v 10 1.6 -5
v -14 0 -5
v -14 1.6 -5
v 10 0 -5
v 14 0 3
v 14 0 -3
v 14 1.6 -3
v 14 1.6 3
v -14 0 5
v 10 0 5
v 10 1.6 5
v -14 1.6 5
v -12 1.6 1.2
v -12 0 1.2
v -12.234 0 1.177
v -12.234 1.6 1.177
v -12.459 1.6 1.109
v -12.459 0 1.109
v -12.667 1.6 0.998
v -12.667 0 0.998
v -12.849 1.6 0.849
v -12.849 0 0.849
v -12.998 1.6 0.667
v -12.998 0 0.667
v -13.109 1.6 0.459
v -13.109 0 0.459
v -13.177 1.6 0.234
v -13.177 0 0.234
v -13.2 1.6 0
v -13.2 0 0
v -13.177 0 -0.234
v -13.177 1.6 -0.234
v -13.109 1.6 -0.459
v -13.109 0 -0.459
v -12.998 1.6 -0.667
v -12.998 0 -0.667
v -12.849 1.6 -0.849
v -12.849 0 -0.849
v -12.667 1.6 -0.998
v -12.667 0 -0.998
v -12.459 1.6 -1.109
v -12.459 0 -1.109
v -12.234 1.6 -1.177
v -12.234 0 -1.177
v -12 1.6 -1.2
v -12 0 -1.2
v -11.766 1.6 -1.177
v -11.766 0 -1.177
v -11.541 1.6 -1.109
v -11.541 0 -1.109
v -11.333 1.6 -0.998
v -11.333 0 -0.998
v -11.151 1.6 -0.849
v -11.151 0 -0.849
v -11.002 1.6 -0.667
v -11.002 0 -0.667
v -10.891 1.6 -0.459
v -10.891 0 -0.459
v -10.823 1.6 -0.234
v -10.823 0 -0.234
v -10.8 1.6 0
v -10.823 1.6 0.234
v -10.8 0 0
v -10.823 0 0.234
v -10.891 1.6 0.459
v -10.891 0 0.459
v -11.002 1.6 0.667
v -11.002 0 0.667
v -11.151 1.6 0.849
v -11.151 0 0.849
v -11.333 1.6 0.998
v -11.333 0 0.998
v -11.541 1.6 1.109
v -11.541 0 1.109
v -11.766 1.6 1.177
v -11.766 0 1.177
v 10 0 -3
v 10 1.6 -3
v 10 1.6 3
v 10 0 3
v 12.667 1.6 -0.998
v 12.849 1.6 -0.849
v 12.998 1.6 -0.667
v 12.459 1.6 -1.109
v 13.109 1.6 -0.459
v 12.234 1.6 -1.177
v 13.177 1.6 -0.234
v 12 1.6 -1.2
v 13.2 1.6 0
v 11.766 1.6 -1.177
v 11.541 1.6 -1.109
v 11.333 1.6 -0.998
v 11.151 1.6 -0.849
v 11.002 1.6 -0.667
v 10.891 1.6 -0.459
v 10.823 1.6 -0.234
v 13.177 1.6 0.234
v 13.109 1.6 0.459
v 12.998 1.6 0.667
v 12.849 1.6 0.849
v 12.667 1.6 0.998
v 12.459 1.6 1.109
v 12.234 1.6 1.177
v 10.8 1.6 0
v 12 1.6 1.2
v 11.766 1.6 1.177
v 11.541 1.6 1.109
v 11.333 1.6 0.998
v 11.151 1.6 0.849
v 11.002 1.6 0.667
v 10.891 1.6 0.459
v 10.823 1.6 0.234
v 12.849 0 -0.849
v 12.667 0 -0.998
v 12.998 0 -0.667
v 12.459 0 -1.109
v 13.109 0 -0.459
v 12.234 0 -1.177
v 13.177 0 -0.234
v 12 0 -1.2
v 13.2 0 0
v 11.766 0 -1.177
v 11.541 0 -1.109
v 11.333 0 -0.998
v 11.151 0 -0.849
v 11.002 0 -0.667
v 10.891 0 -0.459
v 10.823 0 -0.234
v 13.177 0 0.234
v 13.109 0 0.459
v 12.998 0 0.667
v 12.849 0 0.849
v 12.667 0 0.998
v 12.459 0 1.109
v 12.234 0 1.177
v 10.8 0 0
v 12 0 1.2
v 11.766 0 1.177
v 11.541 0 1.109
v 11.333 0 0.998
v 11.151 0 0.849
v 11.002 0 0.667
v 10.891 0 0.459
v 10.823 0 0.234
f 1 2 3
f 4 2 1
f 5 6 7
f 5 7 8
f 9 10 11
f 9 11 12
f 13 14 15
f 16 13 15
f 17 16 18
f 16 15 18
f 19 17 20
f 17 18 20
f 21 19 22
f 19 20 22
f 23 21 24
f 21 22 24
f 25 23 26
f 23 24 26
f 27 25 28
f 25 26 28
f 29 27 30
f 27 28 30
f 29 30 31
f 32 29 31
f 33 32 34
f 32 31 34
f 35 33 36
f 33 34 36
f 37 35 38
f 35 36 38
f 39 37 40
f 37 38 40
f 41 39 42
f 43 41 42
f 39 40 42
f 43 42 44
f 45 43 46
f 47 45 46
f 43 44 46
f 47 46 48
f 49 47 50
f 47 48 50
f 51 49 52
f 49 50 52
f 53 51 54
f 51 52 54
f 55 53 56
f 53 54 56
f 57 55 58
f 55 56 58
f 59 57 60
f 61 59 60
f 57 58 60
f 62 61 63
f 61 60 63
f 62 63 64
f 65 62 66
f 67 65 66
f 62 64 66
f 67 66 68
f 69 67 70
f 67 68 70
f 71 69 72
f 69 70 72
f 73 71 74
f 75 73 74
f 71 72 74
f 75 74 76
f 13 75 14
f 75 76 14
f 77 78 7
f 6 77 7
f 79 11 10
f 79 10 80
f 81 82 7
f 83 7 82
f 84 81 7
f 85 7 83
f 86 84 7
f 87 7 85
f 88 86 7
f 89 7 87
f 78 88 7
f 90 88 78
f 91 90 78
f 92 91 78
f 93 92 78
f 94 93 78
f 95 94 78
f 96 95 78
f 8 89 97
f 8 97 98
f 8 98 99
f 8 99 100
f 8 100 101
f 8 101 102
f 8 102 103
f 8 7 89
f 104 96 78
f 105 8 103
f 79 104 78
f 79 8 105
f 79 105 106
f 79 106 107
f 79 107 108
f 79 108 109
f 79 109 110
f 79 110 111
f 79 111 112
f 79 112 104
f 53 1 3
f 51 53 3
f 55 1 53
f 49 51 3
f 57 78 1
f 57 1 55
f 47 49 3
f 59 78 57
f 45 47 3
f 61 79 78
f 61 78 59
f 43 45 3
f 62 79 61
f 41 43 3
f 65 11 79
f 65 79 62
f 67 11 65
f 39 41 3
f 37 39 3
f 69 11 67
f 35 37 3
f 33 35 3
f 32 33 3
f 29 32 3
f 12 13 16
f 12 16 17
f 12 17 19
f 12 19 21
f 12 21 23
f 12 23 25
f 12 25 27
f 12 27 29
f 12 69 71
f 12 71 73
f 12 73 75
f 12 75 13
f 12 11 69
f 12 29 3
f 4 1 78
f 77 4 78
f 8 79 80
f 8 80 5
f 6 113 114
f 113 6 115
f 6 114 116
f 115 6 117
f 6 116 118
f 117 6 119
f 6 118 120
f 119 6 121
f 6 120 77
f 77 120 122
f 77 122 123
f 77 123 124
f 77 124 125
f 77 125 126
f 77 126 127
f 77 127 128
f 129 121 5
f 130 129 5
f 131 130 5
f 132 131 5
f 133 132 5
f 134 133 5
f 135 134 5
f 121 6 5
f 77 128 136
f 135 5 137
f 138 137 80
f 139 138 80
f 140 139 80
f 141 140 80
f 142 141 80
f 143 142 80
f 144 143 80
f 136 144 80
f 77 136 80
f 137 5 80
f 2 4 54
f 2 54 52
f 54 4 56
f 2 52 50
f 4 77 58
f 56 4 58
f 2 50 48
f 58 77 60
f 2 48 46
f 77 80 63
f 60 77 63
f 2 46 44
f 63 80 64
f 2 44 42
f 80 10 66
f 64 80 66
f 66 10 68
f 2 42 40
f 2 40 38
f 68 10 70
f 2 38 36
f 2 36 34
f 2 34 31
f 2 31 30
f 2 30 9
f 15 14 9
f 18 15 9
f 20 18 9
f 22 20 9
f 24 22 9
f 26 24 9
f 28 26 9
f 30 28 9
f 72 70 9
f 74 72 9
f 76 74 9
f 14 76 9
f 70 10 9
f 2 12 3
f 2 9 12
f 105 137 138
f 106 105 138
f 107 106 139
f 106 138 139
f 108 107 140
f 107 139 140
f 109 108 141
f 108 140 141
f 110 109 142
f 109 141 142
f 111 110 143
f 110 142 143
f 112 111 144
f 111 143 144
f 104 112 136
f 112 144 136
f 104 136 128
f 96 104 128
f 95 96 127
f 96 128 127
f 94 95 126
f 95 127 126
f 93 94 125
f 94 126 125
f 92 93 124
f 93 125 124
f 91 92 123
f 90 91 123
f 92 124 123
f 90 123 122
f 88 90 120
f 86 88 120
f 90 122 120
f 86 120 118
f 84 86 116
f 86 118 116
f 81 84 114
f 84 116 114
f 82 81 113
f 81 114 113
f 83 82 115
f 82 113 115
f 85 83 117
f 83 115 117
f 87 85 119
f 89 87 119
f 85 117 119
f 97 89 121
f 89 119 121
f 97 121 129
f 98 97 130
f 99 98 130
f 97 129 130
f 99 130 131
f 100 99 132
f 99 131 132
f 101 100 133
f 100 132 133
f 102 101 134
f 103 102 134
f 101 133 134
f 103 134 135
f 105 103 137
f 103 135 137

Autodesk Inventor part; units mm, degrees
ref_plane "XZ Plane" through (0, 0, 0) normal (0, 1, 0) x (-1, 0, 0)
ref_plane "XY Plane" through (0, 0, 0) normal (0, 0, 1) x (1, 0, 0)
sketch "スケッチ1" plane through (0, 0, 0) normal (0, 1, 0) x (-1, 0, 0)
  line L0 (14, -5) -> (-14, -5)
  line L1 (-14, -5) -> (-14, 5)
  line L2 (-14, 5) -> (14, 5)
  line L3 (14, 5) -> (14, -5)
  line L4 (-14, 5) -> (14, -5) construction
  line L5 (14, 5) -> (-14, -5) construction
  point P0 (0, 0)
  point P1 (0, 0)
  dimension "d1" = 10
  dimension "d13" = 14
extrude "押し出し1" add sketch "スケッチ1" along normal blind 1.6
sketch "スケッチ3" plane through (0, 1.6, 0) normal (0, 1, 0) x (1, 0, 0)
  line L0 (14, -5) -> (14, 5) projected
  line L1 (14, 5) -> (10, 5)
  line L2 (10, 5) -> (10, 3)
  line L3 (10, 3) -> (14, 3)
  line L4 (14, 3) -> (14, 5)
  line L5 (-12.25, 0) -> (12.25, 0)
  line L6 (10, -5) -> (10, -3)
  line L7 (10, -3) -> (14, -3)
  line L8 (14, -5) -> (10, -5)
  line L9 (14, -3) -> (14, -5)
  point P0 (0, 0)
  dimension "d16" = 4
  dimension "d17" = 2
extrude "押し出し2" cut sketch "スケッチ3" against normal blind 10
sketch "スケッチ4" plane through (0, 1.6, 0) normal (0, 1, 0) x (1, 0, 0)
  line L0 (10, 3) -> (10, 5) projected
  line L1 (10, -5) -> (10, -3) projected
  line L2 (10, 3) -> (10, -3)
  line L3 (10, 0) -> (14, 0)
  line L4 (14, -3) -> (14, 3) projected
  line L5 (-14, 5) -> (-14, -5) projected
  line L6 (-14, 0) -> (-12, 0)
  point P0 (0, 0)
  point P1 (12, 0)
  dimension "d27" = 2
hole "穴2" at (12, 1.6, 0) at (-12, 1.6, 0) direction (0, -1, 0) diameter 2.4 end through all clearance for "Countersunk Flat Head Screw ISO 2009/7046" size "M2" standard "ISO"
sketch "スケッチ7" plane through (0, 0, 0) normal (0, -1, 0) x (1, 0, 0)
  line L0 (75.7308, 106.5202) -> (76.0585, -99.7224)
  line L1 (75.7308, 106.5202) -> (76.0585, -99.7224)
  line L2 (0, 147.7687) -> (0, -140.9709) projected
  line L3 (75.7308, 106.5202) -> (76.0585, -99.7224)
  line L4 (14, 3) -> (14, -3) projected
  point P0 (0, 0)
  point P1 (6.4022, -1.407)
  point P2 (6.4022, -1.407)
  point P3 (-4, 0.784)
  dimension "d28" = 69.5
  dimension "d29" = 7.5978
  dimension "d31" = 18
  dimension "d32" = 79.8987
properties part number "SideSensorCircuit"
